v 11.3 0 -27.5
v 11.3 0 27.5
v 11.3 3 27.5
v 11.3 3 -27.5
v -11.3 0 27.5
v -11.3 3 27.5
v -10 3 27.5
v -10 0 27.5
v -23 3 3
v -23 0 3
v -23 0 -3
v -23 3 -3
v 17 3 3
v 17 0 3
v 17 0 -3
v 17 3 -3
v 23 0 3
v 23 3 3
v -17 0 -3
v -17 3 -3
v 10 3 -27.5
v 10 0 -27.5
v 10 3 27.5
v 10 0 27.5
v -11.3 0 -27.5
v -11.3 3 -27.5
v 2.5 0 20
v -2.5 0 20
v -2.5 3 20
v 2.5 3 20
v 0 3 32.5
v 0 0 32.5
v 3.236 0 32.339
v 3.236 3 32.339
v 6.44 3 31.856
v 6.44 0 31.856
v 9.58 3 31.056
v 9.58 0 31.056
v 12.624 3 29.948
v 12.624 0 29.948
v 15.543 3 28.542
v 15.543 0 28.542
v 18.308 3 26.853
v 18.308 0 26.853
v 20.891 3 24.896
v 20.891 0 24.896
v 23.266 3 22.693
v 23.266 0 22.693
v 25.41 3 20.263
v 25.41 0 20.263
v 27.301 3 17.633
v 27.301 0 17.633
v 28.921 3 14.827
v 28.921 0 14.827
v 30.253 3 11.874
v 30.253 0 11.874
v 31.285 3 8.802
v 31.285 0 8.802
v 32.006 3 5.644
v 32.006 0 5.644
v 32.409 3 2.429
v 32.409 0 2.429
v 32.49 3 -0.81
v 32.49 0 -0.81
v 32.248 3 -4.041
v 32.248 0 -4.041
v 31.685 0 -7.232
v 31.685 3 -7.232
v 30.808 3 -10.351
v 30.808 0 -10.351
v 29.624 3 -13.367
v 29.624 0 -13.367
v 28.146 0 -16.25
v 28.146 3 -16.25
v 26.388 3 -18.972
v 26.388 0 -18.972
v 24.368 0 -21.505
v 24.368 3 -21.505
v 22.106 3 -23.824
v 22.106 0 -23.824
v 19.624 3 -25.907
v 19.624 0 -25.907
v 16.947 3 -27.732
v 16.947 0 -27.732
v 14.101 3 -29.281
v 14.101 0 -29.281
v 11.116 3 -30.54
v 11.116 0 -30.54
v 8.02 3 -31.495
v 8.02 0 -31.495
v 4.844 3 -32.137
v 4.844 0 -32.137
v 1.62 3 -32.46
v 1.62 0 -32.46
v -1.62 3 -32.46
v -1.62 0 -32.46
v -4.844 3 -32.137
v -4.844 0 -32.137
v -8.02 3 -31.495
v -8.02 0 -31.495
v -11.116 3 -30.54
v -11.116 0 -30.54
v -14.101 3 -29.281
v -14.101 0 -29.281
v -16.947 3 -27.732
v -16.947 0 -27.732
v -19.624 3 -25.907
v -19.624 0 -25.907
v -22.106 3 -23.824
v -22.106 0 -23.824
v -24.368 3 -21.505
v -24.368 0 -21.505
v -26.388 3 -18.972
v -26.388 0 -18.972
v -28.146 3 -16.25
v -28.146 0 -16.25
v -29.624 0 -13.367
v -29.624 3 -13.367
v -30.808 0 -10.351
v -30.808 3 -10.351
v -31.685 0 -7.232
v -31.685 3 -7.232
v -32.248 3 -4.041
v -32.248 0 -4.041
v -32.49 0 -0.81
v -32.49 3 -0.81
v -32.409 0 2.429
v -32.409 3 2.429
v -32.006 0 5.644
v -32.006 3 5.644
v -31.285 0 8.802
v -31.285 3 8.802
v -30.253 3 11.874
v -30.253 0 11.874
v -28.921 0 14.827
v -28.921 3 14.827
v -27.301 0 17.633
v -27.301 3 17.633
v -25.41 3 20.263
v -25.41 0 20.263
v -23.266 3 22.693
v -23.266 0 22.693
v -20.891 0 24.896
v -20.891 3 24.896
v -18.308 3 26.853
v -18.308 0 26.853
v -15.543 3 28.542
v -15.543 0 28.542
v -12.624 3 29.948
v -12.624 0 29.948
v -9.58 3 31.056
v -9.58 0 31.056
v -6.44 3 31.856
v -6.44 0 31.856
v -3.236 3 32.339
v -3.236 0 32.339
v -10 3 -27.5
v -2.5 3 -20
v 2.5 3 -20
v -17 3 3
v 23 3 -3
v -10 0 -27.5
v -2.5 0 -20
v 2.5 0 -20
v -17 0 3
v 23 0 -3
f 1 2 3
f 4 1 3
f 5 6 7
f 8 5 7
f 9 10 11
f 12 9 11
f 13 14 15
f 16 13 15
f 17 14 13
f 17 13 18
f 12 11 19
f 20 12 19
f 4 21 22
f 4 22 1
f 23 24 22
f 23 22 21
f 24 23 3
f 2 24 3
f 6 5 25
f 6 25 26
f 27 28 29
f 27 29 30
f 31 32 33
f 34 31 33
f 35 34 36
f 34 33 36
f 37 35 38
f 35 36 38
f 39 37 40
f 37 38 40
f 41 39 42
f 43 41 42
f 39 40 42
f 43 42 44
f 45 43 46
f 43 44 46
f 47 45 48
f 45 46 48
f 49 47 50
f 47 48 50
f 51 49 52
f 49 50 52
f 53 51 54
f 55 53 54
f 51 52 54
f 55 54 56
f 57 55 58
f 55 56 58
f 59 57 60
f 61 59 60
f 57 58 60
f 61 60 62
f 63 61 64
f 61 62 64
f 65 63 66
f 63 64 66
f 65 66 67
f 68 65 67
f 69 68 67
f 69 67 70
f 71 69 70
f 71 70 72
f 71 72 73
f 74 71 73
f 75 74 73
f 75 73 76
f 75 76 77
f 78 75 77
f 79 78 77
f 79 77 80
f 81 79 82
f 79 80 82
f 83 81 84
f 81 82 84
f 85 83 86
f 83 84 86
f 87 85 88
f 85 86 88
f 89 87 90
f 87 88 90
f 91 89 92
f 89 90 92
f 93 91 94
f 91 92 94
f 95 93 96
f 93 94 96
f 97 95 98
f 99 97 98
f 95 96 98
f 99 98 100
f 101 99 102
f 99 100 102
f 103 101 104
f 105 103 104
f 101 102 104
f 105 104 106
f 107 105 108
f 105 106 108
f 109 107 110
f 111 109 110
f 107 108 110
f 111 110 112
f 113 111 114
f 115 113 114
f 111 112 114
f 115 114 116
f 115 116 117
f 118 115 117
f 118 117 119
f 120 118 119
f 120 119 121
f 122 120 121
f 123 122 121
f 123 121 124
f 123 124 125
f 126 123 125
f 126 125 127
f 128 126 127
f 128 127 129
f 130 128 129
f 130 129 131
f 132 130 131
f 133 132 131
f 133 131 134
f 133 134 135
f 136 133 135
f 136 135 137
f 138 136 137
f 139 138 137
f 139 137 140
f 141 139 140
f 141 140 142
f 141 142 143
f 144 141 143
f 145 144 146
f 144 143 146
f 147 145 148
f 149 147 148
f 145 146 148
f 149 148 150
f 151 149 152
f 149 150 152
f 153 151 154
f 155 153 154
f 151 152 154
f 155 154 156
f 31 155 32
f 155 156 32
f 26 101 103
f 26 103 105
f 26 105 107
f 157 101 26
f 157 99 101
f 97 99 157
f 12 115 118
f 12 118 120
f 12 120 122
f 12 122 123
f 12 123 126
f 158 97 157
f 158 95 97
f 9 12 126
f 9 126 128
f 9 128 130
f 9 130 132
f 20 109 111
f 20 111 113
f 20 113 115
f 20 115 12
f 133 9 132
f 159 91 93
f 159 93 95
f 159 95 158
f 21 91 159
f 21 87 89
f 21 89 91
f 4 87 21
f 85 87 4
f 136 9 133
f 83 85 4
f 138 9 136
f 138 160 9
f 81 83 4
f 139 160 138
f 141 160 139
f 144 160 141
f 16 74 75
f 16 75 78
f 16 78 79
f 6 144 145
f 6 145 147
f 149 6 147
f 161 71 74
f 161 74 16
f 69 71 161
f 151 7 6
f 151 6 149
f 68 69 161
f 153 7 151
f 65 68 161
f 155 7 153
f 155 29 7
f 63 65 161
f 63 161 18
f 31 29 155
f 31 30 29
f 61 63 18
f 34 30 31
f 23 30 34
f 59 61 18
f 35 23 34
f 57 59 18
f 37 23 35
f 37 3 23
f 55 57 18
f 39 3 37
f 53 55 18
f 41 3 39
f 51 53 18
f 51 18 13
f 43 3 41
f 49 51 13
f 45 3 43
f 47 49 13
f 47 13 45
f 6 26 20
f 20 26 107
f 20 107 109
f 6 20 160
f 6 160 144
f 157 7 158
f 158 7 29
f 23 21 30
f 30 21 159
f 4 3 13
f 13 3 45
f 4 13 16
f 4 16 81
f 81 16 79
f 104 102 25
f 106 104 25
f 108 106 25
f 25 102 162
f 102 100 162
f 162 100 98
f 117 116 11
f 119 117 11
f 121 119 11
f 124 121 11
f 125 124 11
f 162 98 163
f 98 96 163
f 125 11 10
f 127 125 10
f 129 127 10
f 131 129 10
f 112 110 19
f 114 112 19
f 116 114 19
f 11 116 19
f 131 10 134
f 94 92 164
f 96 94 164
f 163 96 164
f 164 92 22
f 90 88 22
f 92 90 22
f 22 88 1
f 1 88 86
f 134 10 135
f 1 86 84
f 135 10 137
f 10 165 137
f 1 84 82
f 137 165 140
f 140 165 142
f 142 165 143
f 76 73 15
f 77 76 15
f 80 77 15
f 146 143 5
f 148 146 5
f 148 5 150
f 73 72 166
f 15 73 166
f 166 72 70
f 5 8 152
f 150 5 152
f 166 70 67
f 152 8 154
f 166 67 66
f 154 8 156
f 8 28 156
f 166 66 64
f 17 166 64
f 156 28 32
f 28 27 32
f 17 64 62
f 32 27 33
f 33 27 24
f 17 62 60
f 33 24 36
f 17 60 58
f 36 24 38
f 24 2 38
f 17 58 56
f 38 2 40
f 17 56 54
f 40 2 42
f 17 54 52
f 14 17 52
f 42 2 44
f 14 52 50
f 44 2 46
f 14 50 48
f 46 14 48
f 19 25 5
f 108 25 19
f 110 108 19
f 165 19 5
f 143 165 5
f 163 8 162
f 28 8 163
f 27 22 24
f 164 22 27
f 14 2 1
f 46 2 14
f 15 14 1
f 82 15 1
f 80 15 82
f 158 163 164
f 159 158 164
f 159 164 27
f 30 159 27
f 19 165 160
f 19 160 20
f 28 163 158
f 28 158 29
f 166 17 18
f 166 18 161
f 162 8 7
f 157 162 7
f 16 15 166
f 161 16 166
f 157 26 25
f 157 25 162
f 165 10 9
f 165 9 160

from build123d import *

# Parameters (mm, degrees)
SKETCH1_R               = 32.5
BOSS_EXTRUDE1_DEPTH     = 3
CUT_EXTRUDE1_DEPTH      = 27.5
CUT_EXTRUDE1_DEPTH_BACK = 27.5
SKETCH2_W               = 1.3
SKETCH2_H               = 6.728638504
SKETCH3_W               = 6
SKETCH3_H               = 6
CUT_EXTRUDE2_DEPTH      = 10
SKETCH4_W               = 5
SKETCH4_H               = 40
CUT_EXTRUDE3_DEPTH      = 10


with BuildPart() as part:
    # Sketch1 → Boss-Extrude1 (new body)
    with BuildSketch(Plane(origin=(0, 0, 0), x_dir=(1, 0, 0), z_dir=(0, 1, 0))):
        Circle(SKETCH1_R)
    extrude(amount=BOSS_EXTRUDE1_DEPTH)

    # Sketch2 → Cut-Extrude1 (cut, two sides: drawn at the far end of the back side and taken through both)
    with BuildSketch(Plane.XY.offset(-CUT_EXTRUDE1_DEPTH_BACK)):
        with Locations((-10.65, 0)):
            Rectangle(SKETCH2_W, SKETCH2_H)
        with Locations((10.65, 0)):
            Rectangle(SKETCH2_W, SKETCH2_H)
    extrude(amount=CUT_EXTRUDE1_DEPTH + CUT_EXTRUDE1_DEPTH_BACK, mode=Mode.SUBTRACT)

    # Sketch3 → Cut-Extrude2 (cut)
    with BuildSketch(Plane(origin=(0, 0, 0), x_dir=(1, 0, 0), z_dir=(0, 1, 0))):
        with Locations((-20, 0)):
            Rectangle(SKETCH3_W, SKETCH3_H)
        with Locations((20, 0)):
            Rectangle(SKETCH3_W, SKETCH3_H)
    extrude(amount=CUT_EXTRUDE2_DEPTH, mode=Mode.SUBTRACT)

    # Sketch4 → Cut-Extrude3 (cut)
    with BuildSketch(Plane.XZ):
        Rectangle(SKETCH4_W, SKETCH4_H)
    extrude(amount=-CUT_EXTRUDE3_DEPTH, mode=Mode.SUBTRACT)


solid = part.part
